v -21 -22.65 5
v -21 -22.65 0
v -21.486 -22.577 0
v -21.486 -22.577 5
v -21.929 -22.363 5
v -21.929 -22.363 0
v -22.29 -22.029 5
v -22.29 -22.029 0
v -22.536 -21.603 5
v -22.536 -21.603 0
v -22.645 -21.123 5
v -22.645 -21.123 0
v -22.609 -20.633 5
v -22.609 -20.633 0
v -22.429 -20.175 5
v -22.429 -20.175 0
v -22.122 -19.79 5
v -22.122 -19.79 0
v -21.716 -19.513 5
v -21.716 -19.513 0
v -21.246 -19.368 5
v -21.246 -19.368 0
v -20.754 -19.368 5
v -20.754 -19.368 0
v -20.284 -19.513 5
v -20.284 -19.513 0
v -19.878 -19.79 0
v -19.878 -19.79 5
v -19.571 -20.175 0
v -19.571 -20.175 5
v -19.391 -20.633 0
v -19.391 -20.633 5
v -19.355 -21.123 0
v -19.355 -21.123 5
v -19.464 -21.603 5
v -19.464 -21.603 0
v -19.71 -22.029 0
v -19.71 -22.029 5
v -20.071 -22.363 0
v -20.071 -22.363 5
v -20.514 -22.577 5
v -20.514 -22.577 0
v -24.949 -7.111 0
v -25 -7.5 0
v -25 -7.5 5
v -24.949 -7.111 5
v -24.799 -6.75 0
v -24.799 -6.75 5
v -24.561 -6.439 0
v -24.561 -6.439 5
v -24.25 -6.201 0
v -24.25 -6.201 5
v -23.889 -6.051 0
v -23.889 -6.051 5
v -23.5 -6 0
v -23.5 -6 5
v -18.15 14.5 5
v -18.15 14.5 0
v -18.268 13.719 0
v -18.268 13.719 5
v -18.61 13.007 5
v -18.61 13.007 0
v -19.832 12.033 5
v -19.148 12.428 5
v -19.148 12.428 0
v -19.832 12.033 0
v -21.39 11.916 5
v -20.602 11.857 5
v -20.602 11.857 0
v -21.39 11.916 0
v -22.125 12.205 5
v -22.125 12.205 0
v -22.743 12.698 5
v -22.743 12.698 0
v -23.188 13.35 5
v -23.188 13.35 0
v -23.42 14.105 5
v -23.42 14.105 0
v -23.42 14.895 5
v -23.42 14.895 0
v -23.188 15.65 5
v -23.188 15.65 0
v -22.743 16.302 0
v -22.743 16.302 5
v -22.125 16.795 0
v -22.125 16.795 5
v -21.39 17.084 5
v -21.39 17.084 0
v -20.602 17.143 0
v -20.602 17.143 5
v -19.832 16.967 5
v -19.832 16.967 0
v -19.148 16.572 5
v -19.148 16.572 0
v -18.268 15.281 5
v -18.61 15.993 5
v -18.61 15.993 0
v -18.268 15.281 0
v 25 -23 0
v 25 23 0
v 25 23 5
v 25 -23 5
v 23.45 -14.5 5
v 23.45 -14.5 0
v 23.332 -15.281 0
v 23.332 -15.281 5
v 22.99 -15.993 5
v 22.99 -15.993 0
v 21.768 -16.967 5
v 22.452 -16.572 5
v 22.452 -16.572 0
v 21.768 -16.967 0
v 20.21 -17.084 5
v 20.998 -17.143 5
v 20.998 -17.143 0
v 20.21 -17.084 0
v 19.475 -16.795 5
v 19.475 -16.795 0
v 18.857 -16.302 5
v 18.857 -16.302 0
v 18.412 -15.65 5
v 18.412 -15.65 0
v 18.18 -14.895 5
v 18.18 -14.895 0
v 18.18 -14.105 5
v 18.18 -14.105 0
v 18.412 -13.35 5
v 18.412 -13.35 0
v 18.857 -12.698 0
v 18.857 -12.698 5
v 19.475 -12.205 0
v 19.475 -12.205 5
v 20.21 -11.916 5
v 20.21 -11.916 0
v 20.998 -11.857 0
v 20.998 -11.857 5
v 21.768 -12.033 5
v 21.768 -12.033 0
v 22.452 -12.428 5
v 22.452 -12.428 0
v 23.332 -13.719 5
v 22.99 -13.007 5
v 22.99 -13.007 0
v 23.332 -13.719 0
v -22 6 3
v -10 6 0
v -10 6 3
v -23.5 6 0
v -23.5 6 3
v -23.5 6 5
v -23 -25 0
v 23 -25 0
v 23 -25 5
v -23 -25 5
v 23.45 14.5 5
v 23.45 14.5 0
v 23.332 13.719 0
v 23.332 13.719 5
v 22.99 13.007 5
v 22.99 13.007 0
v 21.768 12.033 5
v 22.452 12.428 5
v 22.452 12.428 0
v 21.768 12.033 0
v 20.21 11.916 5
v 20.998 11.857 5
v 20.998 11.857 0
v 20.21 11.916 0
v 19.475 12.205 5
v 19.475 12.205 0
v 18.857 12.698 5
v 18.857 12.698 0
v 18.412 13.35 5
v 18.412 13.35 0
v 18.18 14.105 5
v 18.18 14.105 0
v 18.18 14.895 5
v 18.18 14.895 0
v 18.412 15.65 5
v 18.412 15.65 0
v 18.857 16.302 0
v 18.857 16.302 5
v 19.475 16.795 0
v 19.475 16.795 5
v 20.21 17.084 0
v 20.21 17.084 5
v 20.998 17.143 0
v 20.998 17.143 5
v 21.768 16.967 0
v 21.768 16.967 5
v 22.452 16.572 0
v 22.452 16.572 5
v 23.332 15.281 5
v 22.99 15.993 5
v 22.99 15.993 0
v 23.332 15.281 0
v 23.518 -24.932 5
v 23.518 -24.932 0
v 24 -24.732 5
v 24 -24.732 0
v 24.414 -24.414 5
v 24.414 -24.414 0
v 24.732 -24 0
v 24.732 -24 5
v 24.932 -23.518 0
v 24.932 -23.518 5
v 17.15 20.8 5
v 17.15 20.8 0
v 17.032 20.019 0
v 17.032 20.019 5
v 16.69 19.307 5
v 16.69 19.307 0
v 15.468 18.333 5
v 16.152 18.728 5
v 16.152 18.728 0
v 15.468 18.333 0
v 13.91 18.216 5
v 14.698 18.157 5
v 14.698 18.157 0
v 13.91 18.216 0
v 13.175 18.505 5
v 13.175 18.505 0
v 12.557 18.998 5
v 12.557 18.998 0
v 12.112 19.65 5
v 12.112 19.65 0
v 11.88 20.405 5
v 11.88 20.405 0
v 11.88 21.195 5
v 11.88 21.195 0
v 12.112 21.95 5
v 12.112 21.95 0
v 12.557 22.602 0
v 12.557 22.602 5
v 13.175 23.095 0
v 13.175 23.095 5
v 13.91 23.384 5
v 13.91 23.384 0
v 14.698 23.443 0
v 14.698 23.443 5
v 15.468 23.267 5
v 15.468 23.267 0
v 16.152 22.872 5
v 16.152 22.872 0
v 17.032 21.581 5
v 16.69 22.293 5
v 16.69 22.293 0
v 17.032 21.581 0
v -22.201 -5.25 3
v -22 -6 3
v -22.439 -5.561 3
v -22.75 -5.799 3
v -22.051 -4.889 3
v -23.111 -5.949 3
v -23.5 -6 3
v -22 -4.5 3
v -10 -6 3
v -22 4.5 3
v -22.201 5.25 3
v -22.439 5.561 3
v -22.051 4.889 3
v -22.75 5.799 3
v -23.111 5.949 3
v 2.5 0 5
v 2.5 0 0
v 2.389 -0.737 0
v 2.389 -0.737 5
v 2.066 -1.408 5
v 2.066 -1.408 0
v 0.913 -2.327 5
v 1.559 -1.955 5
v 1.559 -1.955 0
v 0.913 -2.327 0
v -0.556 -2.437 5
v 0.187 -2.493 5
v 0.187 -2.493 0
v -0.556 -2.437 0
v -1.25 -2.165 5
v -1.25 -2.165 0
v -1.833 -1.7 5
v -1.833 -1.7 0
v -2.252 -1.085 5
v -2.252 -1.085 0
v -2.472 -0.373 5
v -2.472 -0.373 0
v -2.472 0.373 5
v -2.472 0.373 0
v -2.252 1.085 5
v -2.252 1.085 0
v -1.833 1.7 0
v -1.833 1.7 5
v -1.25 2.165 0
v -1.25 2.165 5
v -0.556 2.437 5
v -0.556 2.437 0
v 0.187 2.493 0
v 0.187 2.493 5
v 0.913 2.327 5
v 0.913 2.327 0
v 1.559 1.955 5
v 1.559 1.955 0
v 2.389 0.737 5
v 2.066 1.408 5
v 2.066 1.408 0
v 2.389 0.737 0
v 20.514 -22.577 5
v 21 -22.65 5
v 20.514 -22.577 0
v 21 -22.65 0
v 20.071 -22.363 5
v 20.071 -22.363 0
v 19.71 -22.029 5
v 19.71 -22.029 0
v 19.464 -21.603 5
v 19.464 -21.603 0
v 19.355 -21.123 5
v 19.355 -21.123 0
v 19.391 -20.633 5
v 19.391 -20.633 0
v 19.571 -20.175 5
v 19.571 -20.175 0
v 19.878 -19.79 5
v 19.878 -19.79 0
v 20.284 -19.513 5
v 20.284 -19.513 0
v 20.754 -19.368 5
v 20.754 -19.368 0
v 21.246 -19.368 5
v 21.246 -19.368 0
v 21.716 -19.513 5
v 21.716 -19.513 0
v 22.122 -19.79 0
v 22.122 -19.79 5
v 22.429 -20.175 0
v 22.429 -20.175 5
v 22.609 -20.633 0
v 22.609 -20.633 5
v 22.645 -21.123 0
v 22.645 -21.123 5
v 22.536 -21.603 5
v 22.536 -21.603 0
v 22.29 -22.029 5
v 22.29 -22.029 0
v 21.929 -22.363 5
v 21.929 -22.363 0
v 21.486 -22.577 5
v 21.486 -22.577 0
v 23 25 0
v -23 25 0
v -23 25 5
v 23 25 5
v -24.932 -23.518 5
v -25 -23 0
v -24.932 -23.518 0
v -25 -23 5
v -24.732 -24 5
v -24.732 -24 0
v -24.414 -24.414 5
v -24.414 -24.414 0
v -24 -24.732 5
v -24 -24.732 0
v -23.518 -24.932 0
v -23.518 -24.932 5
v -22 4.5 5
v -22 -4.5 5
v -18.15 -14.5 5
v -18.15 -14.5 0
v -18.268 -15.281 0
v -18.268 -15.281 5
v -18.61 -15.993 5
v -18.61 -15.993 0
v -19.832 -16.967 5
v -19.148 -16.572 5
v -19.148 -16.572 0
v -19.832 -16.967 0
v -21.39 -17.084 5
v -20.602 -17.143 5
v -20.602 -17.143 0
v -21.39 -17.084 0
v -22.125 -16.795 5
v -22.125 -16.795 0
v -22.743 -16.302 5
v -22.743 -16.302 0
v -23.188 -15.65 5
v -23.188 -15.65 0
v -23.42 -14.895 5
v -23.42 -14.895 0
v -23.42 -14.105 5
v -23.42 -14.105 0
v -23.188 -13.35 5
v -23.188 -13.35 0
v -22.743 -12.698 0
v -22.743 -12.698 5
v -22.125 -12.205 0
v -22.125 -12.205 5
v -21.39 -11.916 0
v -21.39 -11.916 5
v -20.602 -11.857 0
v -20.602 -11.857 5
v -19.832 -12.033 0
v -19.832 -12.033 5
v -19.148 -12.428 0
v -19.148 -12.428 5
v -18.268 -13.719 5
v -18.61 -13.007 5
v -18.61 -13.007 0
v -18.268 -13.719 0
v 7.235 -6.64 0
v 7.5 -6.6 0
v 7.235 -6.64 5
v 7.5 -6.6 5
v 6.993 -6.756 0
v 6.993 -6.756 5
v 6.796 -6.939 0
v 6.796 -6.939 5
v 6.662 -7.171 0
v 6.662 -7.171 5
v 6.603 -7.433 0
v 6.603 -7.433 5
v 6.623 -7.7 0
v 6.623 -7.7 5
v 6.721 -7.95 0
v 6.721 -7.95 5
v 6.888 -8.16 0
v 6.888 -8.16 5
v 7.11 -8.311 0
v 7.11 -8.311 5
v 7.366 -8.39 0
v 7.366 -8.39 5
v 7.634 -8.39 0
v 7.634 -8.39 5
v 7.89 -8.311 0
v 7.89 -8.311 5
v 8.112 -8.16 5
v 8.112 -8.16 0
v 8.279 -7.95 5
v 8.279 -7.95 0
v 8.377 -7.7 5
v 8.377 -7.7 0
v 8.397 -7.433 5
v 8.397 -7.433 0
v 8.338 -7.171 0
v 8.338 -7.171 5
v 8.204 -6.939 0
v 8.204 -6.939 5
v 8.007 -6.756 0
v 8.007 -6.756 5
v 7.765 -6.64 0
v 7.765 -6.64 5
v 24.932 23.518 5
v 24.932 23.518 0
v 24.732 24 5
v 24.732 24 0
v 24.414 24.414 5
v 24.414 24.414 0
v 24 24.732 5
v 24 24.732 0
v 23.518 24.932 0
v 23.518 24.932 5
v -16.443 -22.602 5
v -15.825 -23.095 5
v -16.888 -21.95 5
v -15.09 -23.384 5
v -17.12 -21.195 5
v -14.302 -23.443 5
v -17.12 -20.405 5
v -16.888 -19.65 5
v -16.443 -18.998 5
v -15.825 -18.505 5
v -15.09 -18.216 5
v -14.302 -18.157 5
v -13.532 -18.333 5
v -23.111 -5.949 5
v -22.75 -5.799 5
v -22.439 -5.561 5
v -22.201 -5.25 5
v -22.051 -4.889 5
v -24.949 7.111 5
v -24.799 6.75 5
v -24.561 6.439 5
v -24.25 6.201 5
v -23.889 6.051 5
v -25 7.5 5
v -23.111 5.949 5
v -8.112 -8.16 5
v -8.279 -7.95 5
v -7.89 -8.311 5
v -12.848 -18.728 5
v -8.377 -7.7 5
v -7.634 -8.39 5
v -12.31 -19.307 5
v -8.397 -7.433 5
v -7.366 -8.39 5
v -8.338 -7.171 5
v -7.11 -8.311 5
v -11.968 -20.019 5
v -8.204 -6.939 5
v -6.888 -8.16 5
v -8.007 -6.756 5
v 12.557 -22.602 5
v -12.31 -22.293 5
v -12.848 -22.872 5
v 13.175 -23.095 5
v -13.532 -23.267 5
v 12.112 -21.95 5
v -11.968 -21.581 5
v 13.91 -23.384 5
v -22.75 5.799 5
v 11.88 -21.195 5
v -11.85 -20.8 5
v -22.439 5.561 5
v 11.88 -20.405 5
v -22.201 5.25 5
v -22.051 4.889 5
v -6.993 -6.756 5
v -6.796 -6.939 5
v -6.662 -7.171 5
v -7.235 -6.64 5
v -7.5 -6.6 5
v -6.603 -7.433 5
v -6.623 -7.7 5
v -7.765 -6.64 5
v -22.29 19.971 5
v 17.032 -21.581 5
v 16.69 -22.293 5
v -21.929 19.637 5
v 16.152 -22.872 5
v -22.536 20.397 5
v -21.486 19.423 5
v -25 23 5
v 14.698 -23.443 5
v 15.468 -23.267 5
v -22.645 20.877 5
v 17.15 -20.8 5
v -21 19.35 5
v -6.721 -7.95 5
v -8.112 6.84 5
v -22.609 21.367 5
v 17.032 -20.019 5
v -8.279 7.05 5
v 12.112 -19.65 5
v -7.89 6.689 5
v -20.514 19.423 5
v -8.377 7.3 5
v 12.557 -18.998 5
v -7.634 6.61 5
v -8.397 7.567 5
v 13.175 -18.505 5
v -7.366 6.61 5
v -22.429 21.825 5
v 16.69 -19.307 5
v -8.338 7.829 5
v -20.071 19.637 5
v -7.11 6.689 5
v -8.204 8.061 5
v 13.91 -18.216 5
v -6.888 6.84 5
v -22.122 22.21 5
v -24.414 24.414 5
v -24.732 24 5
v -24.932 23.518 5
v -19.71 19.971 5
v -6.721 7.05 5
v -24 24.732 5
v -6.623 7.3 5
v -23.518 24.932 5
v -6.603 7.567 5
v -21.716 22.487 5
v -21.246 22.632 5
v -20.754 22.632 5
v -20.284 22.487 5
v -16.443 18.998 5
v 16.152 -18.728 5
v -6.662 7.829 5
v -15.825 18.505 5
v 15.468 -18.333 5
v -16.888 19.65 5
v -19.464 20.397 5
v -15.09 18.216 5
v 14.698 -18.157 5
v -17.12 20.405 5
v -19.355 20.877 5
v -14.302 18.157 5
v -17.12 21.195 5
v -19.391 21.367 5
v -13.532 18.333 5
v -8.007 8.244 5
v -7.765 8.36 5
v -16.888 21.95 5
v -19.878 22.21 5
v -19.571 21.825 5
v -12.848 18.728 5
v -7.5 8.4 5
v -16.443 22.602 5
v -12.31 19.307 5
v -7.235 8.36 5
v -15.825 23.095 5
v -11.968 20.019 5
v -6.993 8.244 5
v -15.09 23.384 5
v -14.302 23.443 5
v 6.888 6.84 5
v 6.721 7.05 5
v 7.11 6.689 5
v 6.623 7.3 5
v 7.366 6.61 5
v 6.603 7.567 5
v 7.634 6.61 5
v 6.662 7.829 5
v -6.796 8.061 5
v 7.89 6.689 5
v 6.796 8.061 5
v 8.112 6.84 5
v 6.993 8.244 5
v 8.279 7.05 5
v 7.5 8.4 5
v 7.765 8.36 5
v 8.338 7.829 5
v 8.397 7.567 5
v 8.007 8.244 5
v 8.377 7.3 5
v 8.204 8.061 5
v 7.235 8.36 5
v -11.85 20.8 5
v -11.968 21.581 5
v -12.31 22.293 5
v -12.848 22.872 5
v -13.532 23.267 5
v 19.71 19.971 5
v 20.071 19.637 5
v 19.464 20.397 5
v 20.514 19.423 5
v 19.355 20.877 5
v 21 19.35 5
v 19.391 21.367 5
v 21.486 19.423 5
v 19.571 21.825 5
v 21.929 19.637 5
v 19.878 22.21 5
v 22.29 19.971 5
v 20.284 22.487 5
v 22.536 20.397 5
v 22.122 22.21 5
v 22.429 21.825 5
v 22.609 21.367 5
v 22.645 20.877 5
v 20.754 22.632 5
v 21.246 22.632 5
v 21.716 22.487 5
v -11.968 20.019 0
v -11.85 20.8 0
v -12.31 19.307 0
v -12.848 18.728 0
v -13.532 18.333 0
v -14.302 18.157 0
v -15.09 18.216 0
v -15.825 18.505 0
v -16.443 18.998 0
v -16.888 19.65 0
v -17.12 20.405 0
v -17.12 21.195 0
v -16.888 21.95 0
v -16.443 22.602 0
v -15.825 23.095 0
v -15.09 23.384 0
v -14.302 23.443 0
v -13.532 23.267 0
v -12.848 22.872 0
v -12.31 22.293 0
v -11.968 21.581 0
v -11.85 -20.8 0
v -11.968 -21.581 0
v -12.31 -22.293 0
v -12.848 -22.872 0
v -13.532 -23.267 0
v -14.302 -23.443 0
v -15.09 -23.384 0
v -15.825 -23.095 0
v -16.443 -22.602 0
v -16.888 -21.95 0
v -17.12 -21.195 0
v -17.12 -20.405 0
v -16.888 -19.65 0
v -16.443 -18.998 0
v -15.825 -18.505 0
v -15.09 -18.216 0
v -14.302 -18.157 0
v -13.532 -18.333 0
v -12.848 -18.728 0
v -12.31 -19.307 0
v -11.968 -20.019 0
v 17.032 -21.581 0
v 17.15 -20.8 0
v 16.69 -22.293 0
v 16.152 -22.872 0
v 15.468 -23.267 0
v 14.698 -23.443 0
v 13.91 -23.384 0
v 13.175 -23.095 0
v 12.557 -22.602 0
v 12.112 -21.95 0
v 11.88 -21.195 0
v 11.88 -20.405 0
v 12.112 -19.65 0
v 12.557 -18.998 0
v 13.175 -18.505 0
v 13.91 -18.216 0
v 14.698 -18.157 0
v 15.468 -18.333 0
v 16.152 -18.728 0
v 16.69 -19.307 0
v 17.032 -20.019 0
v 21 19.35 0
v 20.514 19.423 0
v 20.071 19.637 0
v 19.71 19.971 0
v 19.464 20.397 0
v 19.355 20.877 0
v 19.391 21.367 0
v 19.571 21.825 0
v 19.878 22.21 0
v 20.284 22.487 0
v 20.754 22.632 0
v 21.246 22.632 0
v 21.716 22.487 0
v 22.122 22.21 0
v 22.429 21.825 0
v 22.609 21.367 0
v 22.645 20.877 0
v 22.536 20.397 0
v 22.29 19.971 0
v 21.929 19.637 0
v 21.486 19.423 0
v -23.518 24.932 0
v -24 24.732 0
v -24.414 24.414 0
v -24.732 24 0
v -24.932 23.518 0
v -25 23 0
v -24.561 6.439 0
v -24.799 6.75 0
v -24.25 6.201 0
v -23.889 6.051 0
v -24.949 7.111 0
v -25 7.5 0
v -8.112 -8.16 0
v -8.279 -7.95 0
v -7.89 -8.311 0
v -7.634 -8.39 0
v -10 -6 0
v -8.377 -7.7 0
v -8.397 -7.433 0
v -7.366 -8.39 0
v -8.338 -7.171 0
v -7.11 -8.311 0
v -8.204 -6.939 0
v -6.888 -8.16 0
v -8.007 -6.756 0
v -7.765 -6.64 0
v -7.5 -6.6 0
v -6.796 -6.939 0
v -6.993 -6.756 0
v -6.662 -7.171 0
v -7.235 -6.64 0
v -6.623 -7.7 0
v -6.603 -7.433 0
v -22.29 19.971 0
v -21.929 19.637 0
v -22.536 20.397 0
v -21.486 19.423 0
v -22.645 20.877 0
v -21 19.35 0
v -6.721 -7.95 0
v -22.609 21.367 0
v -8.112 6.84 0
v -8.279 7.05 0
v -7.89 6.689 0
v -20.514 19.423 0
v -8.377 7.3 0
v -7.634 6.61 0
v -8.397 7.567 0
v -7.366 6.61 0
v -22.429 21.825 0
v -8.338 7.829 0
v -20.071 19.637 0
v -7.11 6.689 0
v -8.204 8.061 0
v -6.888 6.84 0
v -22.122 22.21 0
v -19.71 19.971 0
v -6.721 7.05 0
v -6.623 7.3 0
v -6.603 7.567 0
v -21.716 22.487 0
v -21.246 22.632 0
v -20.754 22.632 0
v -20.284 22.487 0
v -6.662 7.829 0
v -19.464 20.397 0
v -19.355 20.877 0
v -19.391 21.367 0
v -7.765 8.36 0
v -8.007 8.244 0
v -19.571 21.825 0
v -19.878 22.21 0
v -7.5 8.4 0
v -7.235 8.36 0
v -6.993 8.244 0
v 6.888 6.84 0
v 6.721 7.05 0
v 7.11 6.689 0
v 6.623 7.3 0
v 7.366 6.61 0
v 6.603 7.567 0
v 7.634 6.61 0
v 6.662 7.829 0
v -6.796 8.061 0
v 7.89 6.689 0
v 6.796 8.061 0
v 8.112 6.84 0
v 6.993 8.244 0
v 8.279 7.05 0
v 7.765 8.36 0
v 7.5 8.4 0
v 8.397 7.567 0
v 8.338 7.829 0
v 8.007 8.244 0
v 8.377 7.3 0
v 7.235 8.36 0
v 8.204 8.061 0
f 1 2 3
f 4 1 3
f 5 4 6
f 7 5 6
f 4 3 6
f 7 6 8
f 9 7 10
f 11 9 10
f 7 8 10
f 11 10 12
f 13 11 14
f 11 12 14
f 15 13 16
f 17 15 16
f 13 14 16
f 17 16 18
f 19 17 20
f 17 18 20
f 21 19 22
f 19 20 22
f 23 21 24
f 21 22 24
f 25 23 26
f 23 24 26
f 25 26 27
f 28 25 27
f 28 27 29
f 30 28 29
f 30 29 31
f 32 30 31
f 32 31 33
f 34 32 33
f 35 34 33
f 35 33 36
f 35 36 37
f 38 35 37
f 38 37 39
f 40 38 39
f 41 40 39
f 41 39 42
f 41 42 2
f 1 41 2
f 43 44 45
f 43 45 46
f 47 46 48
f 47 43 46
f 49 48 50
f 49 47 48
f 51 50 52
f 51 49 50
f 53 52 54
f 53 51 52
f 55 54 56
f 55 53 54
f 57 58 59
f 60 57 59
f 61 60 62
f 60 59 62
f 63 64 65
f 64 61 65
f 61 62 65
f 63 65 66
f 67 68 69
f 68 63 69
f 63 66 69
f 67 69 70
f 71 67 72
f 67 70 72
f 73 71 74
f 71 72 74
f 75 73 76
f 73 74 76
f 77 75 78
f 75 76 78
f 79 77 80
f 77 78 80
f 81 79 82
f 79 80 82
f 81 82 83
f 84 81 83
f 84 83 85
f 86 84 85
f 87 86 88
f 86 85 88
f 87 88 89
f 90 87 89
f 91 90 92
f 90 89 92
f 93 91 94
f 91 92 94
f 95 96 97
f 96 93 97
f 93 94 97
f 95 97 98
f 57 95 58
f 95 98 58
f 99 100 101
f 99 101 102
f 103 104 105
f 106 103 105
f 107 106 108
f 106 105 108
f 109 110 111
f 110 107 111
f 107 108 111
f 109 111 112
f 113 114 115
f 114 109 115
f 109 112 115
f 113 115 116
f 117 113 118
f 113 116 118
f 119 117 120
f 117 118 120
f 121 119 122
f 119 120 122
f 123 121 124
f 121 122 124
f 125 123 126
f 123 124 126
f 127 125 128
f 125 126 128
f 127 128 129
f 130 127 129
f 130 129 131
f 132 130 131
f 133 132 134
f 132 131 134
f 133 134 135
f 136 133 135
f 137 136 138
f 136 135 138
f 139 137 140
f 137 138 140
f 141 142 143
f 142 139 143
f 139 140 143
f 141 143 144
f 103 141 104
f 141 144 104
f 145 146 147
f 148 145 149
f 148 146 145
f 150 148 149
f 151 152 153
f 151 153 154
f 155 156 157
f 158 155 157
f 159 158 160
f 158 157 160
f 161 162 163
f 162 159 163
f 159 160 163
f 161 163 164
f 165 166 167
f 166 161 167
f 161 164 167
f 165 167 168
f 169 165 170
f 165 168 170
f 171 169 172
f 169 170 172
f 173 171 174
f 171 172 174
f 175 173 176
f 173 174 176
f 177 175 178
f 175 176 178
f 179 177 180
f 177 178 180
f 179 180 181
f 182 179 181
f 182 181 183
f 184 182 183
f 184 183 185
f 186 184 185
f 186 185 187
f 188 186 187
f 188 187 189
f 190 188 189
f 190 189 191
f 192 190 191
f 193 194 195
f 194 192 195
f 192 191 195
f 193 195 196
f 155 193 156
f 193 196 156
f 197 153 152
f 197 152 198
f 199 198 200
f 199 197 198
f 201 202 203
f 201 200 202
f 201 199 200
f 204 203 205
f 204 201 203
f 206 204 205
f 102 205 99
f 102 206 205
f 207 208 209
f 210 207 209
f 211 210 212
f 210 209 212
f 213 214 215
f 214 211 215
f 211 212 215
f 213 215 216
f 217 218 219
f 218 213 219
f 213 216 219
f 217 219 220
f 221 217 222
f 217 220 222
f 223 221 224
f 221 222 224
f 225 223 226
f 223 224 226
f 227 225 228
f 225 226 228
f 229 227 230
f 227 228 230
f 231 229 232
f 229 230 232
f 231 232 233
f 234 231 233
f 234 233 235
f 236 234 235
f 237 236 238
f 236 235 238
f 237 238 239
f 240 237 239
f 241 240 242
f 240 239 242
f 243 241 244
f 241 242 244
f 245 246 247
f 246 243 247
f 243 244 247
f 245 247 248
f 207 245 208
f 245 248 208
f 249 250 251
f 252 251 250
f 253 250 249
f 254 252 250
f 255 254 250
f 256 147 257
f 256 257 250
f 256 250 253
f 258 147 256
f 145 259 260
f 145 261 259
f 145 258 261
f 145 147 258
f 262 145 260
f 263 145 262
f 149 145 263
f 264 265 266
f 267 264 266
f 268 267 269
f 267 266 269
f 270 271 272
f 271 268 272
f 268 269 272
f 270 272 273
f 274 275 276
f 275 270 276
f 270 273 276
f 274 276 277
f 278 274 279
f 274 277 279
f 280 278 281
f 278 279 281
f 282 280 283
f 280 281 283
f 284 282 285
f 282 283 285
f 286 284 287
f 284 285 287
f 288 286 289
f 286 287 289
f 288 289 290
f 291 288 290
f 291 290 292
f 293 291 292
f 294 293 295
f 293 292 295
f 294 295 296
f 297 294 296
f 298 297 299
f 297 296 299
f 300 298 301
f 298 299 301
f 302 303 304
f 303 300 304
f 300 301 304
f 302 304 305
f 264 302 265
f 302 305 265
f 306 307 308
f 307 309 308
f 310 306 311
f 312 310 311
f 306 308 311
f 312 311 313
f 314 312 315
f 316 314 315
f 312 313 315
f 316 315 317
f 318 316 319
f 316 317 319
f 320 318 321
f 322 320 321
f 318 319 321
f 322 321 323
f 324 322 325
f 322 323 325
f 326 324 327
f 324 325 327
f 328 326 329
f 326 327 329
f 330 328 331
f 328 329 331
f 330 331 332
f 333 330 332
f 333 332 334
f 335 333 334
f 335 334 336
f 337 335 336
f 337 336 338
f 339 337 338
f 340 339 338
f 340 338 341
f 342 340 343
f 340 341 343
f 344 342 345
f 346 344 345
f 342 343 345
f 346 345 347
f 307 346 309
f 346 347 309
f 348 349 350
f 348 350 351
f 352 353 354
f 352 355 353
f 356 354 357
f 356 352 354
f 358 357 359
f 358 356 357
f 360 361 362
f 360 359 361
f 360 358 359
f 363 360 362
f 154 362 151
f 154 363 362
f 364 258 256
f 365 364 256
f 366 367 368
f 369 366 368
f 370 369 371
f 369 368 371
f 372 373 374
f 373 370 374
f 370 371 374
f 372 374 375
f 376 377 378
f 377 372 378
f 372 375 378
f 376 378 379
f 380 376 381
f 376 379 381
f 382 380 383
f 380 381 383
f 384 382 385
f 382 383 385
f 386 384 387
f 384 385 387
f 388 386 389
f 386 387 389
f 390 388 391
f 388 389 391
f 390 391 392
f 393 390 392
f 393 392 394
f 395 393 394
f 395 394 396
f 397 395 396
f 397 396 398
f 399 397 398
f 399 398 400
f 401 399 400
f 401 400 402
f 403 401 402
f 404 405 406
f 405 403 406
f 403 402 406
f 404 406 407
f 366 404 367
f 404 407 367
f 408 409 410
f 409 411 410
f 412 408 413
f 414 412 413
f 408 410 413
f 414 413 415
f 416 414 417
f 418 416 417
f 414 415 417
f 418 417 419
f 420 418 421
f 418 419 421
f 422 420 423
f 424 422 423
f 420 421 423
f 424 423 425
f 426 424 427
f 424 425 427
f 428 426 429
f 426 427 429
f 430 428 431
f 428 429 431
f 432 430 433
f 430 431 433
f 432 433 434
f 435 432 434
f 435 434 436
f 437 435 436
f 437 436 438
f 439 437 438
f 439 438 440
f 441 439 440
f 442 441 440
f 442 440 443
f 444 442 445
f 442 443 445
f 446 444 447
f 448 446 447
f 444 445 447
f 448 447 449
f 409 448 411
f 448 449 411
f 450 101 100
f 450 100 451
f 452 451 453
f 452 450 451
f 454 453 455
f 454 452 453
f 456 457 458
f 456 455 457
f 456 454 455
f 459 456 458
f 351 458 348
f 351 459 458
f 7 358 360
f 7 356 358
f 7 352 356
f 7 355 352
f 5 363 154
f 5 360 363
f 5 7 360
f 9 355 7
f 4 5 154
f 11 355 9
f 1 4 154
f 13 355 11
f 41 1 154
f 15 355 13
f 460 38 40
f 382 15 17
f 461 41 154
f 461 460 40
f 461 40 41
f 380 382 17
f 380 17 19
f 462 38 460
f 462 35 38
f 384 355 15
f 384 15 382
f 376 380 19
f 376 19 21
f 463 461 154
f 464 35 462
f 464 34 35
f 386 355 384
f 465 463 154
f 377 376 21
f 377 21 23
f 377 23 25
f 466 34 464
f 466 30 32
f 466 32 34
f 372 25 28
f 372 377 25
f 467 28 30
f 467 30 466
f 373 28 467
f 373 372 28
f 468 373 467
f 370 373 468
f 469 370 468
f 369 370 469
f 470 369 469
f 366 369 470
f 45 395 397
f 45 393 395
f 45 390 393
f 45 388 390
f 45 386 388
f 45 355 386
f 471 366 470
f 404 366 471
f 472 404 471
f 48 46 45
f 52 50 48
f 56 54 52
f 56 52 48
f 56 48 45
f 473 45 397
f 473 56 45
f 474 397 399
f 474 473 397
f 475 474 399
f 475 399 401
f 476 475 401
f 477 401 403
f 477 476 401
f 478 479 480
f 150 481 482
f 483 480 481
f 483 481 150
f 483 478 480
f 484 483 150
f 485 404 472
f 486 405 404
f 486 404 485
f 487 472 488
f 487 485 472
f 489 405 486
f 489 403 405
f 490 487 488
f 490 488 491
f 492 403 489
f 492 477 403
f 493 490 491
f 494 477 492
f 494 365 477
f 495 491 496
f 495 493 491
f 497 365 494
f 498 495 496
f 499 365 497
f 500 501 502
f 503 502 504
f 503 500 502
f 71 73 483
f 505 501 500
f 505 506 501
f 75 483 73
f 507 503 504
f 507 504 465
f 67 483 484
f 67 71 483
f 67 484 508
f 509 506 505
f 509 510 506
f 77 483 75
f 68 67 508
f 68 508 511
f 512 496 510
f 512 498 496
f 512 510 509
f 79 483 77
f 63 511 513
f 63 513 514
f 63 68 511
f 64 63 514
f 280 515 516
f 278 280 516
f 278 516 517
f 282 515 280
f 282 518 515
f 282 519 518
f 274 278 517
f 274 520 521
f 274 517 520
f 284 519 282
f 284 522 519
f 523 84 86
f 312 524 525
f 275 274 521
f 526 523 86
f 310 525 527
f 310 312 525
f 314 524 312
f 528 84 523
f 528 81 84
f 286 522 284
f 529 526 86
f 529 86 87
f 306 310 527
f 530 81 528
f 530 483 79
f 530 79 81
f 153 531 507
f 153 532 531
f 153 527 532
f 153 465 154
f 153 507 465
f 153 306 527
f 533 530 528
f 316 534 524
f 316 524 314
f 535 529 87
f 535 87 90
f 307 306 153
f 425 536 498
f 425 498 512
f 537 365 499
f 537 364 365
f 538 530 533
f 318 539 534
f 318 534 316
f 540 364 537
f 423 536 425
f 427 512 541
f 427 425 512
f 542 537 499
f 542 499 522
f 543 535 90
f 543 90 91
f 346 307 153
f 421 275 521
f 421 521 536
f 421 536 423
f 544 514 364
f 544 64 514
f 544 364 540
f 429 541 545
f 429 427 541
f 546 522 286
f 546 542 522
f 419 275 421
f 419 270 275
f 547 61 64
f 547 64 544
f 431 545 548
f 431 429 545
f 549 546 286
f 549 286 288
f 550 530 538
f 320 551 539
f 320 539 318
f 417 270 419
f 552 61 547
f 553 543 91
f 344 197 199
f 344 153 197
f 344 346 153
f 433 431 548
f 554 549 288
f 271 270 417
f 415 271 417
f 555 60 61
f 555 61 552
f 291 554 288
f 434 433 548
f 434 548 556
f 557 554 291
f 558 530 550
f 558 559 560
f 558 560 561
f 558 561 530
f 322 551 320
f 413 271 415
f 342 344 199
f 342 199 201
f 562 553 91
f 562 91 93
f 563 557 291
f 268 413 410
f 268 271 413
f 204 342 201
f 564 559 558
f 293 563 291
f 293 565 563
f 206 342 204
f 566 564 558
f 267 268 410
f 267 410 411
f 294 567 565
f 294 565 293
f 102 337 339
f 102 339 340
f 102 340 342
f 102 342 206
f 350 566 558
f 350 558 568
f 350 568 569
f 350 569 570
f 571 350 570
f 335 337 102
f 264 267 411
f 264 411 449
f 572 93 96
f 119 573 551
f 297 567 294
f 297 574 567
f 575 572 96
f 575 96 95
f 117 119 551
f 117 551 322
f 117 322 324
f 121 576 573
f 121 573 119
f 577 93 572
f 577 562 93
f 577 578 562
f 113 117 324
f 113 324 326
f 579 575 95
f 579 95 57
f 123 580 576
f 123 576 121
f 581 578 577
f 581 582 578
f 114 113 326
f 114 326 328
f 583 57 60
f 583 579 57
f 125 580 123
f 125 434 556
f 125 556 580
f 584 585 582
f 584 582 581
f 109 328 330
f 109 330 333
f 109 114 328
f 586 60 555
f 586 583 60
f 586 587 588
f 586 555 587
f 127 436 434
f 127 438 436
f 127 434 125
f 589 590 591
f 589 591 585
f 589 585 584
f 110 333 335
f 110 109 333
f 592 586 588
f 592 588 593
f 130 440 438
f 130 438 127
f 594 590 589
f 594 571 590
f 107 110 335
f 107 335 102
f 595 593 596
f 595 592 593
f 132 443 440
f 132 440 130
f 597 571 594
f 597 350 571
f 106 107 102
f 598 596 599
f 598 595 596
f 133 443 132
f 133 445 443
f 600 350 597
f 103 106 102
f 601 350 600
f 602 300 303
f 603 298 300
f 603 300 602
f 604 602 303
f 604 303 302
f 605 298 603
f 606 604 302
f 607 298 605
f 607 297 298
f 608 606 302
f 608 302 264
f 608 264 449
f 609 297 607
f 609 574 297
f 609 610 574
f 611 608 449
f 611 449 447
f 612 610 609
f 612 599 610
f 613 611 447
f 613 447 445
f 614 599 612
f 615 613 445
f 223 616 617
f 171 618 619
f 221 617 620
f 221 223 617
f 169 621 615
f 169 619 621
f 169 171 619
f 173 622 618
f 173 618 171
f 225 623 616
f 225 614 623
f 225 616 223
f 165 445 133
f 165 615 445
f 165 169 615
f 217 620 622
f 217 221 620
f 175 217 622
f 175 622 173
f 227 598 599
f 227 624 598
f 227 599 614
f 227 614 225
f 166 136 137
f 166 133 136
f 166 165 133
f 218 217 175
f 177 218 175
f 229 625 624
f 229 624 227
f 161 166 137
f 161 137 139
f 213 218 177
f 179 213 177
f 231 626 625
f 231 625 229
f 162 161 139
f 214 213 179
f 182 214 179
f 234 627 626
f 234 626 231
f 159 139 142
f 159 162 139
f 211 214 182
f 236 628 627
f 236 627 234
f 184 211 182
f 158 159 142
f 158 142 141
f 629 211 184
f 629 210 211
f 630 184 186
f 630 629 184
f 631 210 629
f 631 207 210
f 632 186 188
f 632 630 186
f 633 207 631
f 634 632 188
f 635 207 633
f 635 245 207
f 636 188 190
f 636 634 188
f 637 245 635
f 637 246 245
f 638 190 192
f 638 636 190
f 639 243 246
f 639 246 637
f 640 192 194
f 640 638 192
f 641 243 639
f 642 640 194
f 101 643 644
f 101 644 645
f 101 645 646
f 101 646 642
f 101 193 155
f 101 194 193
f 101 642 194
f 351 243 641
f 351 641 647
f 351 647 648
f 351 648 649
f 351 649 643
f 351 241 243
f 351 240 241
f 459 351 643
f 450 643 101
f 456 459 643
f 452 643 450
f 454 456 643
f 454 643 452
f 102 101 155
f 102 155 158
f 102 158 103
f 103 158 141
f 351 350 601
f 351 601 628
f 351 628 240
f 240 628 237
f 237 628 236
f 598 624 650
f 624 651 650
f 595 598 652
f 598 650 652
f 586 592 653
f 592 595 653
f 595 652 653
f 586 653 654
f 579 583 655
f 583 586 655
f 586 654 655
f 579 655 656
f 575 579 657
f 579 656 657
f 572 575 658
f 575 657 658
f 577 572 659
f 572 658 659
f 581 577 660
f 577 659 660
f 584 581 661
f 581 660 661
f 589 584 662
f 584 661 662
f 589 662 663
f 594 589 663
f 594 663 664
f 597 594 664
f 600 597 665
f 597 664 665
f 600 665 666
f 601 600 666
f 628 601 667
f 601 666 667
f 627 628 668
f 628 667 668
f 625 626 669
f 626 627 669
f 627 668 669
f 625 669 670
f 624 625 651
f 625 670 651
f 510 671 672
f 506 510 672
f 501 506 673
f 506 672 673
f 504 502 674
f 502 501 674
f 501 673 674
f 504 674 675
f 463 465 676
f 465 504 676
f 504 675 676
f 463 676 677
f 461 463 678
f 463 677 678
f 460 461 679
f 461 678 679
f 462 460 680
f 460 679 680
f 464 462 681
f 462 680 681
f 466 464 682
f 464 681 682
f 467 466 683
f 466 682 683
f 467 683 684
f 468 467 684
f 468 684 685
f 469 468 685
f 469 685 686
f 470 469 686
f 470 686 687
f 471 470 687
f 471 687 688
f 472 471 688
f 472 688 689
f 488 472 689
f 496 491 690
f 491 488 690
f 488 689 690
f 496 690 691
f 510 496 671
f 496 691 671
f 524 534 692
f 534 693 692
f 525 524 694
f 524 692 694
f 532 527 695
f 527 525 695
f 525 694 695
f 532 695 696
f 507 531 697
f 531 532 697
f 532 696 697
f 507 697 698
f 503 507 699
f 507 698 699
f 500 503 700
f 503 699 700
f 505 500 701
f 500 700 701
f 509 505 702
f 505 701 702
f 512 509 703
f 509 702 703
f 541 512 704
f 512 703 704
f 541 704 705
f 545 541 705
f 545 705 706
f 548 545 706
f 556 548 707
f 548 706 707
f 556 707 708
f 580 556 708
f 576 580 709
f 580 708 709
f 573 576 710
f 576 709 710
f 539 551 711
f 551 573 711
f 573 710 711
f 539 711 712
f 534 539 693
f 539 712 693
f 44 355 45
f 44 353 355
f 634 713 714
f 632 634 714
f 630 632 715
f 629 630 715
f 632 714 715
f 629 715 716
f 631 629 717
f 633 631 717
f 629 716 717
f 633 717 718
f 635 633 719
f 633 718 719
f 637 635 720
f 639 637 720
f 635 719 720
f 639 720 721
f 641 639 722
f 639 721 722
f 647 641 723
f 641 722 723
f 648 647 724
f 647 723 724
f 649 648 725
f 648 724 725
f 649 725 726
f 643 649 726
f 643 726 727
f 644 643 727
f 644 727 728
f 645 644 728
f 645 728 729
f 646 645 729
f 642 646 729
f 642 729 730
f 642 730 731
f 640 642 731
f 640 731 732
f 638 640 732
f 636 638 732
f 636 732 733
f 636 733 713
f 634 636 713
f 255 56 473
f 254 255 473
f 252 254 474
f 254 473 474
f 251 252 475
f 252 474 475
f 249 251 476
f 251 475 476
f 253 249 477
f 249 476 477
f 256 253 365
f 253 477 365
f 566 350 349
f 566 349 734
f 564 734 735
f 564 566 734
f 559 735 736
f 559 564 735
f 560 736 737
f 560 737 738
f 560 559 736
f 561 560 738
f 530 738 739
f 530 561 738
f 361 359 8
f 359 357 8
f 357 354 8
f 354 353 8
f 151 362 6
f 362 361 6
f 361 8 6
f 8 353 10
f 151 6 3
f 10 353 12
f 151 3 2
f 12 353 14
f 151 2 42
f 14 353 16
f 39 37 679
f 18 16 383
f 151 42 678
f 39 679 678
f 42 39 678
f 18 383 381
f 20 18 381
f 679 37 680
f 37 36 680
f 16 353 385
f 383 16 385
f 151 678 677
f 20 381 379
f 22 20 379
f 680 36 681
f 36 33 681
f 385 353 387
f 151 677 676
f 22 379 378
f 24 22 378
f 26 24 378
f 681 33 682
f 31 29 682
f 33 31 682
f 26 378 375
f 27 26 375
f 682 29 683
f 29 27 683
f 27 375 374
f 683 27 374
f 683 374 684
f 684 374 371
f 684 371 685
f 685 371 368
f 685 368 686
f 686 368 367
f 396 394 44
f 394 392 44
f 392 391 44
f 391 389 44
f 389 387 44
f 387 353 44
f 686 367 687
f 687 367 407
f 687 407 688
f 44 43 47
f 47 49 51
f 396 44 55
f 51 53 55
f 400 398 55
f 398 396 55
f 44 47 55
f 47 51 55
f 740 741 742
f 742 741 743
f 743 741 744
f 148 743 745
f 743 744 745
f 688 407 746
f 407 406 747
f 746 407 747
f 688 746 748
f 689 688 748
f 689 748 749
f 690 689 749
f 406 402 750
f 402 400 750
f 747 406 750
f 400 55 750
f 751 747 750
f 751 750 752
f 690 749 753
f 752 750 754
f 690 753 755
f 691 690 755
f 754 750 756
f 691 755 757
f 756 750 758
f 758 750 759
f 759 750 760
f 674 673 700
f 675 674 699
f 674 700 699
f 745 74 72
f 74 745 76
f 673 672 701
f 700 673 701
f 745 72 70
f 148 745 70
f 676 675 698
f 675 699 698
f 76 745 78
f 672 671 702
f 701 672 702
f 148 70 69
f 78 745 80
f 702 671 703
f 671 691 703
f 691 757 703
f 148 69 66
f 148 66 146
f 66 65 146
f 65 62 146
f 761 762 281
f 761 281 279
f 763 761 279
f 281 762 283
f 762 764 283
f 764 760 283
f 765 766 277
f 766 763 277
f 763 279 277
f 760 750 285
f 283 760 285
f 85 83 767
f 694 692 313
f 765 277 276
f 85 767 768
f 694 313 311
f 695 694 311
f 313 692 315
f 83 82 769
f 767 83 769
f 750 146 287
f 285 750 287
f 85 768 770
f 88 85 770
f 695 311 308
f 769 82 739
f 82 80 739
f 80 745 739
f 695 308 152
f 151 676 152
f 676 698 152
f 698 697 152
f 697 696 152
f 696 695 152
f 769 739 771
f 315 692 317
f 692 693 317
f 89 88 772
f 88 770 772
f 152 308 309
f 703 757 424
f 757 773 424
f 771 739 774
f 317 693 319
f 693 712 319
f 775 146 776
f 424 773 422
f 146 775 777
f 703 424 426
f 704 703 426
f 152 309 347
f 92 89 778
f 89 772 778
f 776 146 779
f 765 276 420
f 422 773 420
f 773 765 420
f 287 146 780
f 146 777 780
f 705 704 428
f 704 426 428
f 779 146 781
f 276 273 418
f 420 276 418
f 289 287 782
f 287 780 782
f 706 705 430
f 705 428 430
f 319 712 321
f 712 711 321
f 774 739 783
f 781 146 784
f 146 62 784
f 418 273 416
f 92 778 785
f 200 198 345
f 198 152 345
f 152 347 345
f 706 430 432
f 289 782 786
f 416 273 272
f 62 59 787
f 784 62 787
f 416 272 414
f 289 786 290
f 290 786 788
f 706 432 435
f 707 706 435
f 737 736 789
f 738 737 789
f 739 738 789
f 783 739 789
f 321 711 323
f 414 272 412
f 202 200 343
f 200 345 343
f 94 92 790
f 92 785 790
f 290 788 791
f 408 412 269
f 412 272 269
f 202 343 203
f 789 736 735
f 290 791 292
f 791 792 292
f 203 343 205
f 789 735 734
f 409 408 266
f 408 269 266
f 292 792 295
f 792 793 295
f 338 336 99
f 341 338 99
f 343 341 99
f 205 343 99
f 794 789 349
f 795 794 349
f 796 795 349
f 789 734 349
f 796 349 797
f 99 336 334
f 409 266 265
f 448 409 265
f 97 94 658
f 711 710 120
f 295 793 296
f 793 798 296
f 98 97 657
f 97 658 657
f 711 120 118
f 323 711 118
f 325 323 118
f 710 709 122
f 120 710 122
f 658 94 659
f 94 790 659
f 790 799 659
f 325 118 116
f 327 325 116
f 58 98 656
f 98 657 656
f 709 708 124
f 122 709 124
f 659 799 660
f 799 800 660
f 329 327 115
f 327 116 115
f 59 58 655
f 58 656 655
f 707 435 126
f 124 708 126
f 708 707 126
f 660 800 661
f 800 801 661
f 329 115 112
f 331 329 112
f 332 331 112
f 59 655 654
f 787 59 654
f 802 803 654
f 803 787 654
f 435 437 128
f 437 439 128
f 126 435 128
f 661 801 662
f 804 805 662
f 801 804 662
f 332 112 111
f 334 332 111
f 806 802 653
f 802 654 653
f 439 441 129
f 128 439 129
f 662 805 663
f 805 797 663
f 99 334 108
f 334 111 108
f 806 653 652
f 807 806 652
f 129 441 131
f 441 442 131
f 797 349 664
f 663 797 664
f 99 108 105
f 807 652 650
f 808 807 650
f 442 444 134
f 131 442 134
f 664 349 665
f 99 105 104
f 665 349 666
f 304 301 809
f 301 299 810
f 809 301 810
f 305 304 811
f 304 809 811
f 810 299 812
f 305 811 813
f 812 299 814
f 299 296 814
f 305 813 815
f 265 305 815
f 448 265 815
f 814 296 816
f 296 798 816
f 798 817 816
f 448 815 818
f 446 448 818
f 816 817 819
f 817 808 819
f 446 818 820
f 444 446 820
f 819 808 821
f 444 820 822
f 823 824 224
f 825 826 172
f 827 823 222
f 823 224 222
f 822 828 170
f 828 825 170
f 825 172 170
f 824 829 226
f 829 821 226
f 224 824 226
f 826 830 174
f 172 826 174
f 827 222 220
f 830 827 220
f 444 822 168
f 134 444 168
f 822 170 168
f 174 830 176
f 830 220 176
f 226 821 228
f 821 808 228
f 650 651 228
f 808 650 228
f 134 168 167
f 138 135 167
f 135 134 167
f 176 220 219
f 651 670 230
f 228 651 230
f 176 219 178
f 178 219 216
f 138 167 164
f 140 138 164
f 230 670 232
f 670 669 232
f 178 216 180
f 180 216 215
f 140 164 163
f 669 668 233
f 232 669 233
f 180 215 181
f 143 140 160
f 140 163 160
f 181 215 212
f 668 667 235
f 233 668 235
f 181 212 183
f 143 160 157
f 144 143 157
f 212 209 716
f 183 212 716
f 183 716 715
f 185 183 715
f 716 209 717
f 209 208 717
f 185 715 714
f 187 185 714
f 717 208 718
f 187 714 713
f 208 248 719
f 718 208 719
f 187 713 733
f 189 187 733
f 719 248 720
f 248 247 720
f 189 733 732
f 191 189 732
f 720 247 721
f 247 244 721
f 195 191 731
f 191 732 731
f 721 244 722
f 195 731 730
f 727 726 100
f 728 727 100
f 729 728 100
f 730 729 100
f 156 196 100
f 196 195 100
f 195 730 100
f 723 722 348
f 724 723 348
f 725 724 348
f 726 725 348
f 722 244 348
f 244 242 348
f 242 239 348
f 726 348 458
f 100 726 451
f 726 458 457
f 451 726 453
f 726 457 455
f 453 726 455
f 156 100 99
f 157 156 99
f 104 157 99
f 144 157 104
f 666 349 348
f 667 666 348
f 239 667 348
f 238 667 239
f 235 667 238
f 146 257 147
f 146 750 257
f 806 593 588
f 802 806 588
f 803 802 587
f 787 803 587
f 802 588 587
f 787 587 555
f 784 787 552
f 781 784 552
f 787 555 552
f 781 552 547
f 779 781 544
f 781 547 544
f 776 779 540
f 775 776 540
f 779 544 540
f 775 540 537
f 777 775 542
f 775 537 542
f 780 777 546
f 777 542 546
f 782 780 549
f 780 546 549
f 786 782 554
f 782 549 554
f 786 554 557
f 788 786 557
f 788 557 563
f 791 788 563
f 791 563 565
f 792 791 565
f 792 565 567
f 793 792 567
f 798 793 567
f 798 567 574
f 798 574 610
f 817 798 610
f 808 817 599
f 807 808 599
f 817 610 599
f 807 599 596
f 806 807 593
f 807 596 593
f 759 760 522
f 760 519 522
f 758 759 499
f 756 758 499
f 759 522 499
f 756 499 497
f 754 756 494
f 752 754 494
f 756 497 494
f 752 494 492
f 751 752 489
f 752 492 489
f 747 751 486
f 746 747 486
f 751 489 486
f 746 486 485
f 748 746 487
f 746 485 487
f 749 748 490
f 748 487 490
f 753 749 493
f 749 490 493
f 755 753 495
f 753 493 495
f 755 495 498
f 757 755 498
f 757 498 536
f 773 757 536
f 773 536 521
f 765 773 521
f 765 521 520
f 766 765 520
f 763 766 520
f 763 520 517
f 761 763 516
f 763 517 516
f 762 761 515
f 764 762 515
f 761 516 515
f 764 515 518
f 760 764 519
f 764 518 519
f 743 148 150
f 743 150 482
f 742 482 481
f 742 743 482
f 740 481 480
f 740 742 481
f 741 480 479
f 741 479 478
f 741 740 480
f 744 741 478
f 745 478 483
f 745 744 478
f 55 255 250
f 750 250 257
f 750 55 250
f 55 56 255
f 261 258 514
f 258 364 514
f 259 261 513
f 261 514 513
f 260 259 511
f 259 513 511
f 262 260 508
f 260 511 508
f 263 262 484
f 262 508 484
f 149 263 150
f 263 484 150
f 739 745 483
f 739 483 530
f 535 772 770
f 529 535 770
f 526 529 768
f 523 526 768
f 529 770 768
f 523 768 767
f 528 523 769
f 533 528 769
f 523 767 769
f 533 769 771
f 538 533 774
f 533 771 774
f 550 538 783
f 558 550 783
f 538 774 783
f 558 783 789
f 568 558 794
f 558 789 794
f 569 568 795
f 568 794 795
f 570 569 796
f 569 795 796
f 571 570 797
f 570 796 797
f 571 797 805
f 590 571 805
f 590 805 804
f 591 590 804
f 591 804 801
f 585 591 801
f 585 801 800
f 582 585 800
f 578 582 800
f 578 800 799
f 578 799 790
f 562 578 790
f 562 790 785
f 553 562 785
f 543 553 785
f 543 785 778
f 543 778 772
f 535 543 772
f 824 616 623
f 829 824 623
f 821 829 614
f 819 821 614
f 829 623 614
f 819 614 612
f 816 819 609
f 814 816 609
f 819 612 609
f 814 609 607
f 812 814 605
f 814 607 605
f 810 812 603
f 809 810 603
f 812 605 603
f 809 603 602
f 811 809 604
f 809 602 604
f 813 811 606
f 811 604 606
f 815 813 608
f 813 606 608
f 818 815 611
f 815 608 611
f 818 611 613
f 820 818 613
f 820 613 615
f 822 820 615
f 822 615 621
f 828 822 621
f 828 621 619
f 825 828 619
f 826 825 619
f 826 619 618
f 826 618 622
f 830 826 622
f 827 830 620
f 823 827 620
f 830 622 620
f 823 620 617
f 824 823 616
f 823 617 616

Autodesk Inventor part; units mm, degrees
ref_plane "YZ Plane" through (0, 0, 0) normal (1, 0, 0) x (0, 1, 0)
ref_plane "XZ Plane" through (0, 0, 0) normal (0, 1, 0) x (-1, 0, 0)
ref_plane "XY Plane" through (0, 0, 0) normal (0, 0, 1) x (1, 0, 0)
sketch "Sketch1" plane through (0, 0, 0) normal (0, 0, 1) x (1, 0, 0)
  line L0 (-25, 25) -> (25, 25)
  line L1 (25, 25) -> (25, -25)
  line L2 (25, -25) -> (-25, -25)
  line L3 (-25, -25) -> (-25, 25)
  line L4 (-25, 25) -> (25, -25) construction
  line L5 (25, 25) -> (-25, -25) construction
  circle A0 centre (0, 0) radius 2.5
  circle A1 centre (-20.8, -14.5) radius 2.65
  circle A2 centre (-14.5, -20.8) radius 2.65
  circle A3 centre (-20.8, 14.5) radius 2.65
  circle A4 centre (20.8, -14.5) radius 2.65
  circle A5 centre (20.8, 14.5) radius 2.65
  circle A6 centre (-14.5, 20.8) radius 2.65
  circle A7 centre (14.5, -20.8) radius 2.65
  circle A8 centre (14.5, 20.8) radius 2.65
  dimension "d0" = 50
  dimension "d1" = 50
  dimension "d2" = 5
  dimension "d5" = 5.3
  dimension "d6" = 4.2
  dimension "d8" = 10.5
  dimension "d11" = 29
  dimension "d14" = 41.6
extrude "Extrusion1" add sketch "Sketch1" along normal blind 5
fillet "Fillet1" radius 2 4 edges at (-25, 25, 2.5) (25, 25, 2.5) (-25, -25, 2.5) (25, -25, 2.5)
sketch "Sketch2" plane through (0, 0, 5) normal (0, 0, 1) x (1, 0, 0)
  arc A0 (23, -25) -> (25, -23) centre (23, -23) ccw projected
  line L0 (25, -23) -> (25, 23) projected
  arc A1 (25, 23) -> (23, 25) centre (23, 23) ccw projected
  line L1 (23, 25) -> (-23, 25) projected
  arc A2 (-23, 25) -> (-25, 23) centre (-23, 23) ccw projected
  line L2 (-25, 23) -> (-25, -23) projected
  arc A3 (-25, -23) -> (-23, -25) centre (-23, -23) ccw projected
  line L3 (-23, -25) -> (23, -25) projected
  circle A4 centre (14.5, 20.8) radius 2.65 projected
  circle A5 centre (-14.5, 20.8) radius 2.65 projected
  circle A6 centre (14.5, -20.8) radius 2.65 projected
  circle A7 centre (20.8, 14.5) radius 2.65 projected
  circle A8 centre (20.8, -14.5) radius 2.65 projected
  circle A9 centre (-20.8, 14.5) radius 2.65 projected
  circle A10 centre (-14.5, -20.8) radius 2.65 projected
  circle A11 centre (-20.8, -14.5) radius 2.65 projected
  circle A12 centre (0, 0) radius 2.5 projected
  line L4 (21, -21) -> (-21, -21)
  line L5 (-21, -21) -> (-21, 21)
  line L6 (-21, 21) -> (21, 21)
  line L7 (21, 21) -> (21, -21)
  line L8 (21, -21) -> (-21, 21) construction
  line L9 (-21, -21) -> (21, 21) construction
  circle A13 centre (-28.6, 21.06) radius 1.55 projected
  dimension "d18" = 42
  dimension "d19" = 42
hole "Hole1" at (-21, 21, 5) at (21, 21, 5) at (21, -21, 5) at (-21, -21, 5) direction (0, 0, -1) diameter 3.3 end through all both
sketch "Sketch3" plane through (0, 0, 0) normal (0, 0, -1) x (-1, 0, 0)
  circle A0 centre (-21, -21) radius 1.65 construction
  circle A1 centre (21, 21) radius 1.65 construction
  circle A2 centre (-21, 21) radius 1.65 construction
  circle A3 centre (21, -21) radius 1.65 construction
  circle A4 centre (-14.5, 20.8) radius 2.65 construction
  circle A5 centre (14.5, 20.8) radius 2.65 construction
  circle A6 centre (-14.5, -20.8) radius 2.65 construction
  circle A7 centre (-20.8, 14.5) radius 2.65 construction
  circle A8 centre (-20.8, -14.5) radius 2.65 construction
  circle A9 centre (20.8, 14.5) radius 2.65 construction
  circle A10 centre (14.5, -20.8) radius 2.65 construction
  circle A11 centre (20.8, -14.5) radius 2.65 construction
  circle A12 centre (0, 0) radius 2.5 construction
  arc A13 (-25, -23) -> (-23, -25) centre (-23, -23) ccw construction
  line L0 (-23, -25) -> (23, -25) construction
  arc A14 (23, -25) -> (25, -23) centre (23, -23) ccw construction
  line L1 (25, -23) -> (25, 23) construction
  arc A15 (25, 23) -> (23, 25) centre (23, 23) ccw construction
  line L2 (23, 25) -> (-23, 25) construction
  arc A16 (-23, 25) -> (-25, 23) centre (-23, 23) ccw construction
  line L3 (-25, 23) -> (-25, -23) construction
  circle A17 centre (-7.5, 7.5) radius 0.9 construction
  circle A18 centre (7.5, 7.5) radius 0.9 construction
  circle A19 centre (7.5, -7.5) radius 0.9 construction
  circle A20 centre (-7.5, -7.5) radius 0.9 construction
hole "Hole2" at (7.5, 7.5, 0) at (-7.5, 7.5, 0) at (-7.5, -7.5, 0) at (7.5, -7.5, 0) direction (0, 0, 1) diameter 1.8 end through all
sketch "Sketch4" plane through (0, 0, 0) normal (0, 0, -1) x (-1, 0, 0)
  line L0 (15, 15) -> (15, -15) construction
  line L1 (-15, 15) -> (15, 15) construction
  line L2 (15, -15) -> (-15, -15) construction
  line L3 (-15, -15) -> (-15, 15) construction
  circle A0 centre (7.5, -7.5) radius 0.9 construction
  circle A1 centre (-7.5, 7.5) radius 0.9 construction
  circle A2 centre (7.5, 7.5) radius 0.9 construction
  circle A3 centre (-7.5, -7.5) radius 0.9 construction
  circle A4 centre (-21, -21) radius 1.65 construction
  circle A5 centre (21, 21) radius 1.65 construction
  circle A6 centre (-21, 21) radius 1.65 construction
  circle A7 centre (21, -21) radius 1.65 construction
  circle A8 centre (-14.5, 20.8) radius 2.65 construction
  circle A9 centre (14.5, 20.8) radius 2.65 construction
  circle A10 centre (-14.5, -20.8) radius 2.65 construction
  circle A11 centre (-20.8, 14.5) radius 2.65 construction
  circle A12 centre (-20.8, -14.5) radius 2.65 construction
  circle A13 centre (20.8, 14.5) radius 2.65 construction
  circle A14 centre (14.5, -20.8) radius 2.65 construction
  circle A15 centre (20.8, -14.5) radius 2.65 construction
  circle A16 centre (0, 0) radius 2.5 construction
  arc A17 (-25, -23) -> (-23, -25) centre (-23, -23) ccw construction
  line L4 (-23, -25) -> (23, -25) construction
  arc A18 (23, -25) -> (25, -23) centre (23, -23) ccw construction
  line L5 (25, -23) -> (25, 23) construction
  arc A19 (25, 23) -> (23, 25) centre (23, 23) ccw construction
  line L6 (23, 25) -> (-23, 25) construction
  arc A20 (-23, 25) -> (-25, 23) centre (-23, 23) ccw construction
  line L7 (-25, 23) -> (-25, -23) construction
  line L8 (-25, -23) -> (-25, 23) construction
  line L9 (-25, 0) -> (25, 0) construction
  line L10 (25, 23) -> (25, -23) construction
  line L11 (10, 6) -> (15, 6) construction
  line L12 (15, 6) -> (15, -6) construction
  line L13 (15, -6) -> (10, -6) construction
  line L14 (10, -6) -> (10, 6) construction
  line L15 (10, 6) -> (25, 6)
  line L16 (25, 6) -> (25, -6)
  line L17 (25, -6) -> (10, -6)
  line L18 (10, -6) -> (10, 6)
  dimension "d34" = 5
  dimension "d35" = 12
extrude "Extrusion2" cut sketch "Sketch4" against normal blind 3
sketch "Sketch5" plane through (0, 0, 3) normal (0, 0, -1) x (-1, 0, 0)
  line L0 (10, 6) -> (25, 6) projected
  line L1 (10, -6) -> (10, 6) projected
  line L2 (25, -6) -> (10, -6) projected
  line L3 (25, 6) -> (25, -6) projected
  line L4 (25, 6) -> (25, -6) projected
  line L5 (25, -6) -> (10, -6) projected
  line L6 (25, 6) -> (22, 6)
  line L7 (22, 6) -> (22, -6)
  line L8 (22, -6) -> (25, -6)
  line L9 (25, -6) -> (25, 6)
  point P0 (0, 0)
  dimension "d38" = 3
extrude "Extrusion3" cut sketch "Sketch5" against normal up to surface (2 mm away) contours L0 L3 L2 L7
fillet "Fillet2" radius 1.5 4 edges at (-25, 6, 2.5) (-25, -6, 2.5) (-22, 6, 4) (-22, -6, 4)
properties part number "20_IM_LED_holder"
